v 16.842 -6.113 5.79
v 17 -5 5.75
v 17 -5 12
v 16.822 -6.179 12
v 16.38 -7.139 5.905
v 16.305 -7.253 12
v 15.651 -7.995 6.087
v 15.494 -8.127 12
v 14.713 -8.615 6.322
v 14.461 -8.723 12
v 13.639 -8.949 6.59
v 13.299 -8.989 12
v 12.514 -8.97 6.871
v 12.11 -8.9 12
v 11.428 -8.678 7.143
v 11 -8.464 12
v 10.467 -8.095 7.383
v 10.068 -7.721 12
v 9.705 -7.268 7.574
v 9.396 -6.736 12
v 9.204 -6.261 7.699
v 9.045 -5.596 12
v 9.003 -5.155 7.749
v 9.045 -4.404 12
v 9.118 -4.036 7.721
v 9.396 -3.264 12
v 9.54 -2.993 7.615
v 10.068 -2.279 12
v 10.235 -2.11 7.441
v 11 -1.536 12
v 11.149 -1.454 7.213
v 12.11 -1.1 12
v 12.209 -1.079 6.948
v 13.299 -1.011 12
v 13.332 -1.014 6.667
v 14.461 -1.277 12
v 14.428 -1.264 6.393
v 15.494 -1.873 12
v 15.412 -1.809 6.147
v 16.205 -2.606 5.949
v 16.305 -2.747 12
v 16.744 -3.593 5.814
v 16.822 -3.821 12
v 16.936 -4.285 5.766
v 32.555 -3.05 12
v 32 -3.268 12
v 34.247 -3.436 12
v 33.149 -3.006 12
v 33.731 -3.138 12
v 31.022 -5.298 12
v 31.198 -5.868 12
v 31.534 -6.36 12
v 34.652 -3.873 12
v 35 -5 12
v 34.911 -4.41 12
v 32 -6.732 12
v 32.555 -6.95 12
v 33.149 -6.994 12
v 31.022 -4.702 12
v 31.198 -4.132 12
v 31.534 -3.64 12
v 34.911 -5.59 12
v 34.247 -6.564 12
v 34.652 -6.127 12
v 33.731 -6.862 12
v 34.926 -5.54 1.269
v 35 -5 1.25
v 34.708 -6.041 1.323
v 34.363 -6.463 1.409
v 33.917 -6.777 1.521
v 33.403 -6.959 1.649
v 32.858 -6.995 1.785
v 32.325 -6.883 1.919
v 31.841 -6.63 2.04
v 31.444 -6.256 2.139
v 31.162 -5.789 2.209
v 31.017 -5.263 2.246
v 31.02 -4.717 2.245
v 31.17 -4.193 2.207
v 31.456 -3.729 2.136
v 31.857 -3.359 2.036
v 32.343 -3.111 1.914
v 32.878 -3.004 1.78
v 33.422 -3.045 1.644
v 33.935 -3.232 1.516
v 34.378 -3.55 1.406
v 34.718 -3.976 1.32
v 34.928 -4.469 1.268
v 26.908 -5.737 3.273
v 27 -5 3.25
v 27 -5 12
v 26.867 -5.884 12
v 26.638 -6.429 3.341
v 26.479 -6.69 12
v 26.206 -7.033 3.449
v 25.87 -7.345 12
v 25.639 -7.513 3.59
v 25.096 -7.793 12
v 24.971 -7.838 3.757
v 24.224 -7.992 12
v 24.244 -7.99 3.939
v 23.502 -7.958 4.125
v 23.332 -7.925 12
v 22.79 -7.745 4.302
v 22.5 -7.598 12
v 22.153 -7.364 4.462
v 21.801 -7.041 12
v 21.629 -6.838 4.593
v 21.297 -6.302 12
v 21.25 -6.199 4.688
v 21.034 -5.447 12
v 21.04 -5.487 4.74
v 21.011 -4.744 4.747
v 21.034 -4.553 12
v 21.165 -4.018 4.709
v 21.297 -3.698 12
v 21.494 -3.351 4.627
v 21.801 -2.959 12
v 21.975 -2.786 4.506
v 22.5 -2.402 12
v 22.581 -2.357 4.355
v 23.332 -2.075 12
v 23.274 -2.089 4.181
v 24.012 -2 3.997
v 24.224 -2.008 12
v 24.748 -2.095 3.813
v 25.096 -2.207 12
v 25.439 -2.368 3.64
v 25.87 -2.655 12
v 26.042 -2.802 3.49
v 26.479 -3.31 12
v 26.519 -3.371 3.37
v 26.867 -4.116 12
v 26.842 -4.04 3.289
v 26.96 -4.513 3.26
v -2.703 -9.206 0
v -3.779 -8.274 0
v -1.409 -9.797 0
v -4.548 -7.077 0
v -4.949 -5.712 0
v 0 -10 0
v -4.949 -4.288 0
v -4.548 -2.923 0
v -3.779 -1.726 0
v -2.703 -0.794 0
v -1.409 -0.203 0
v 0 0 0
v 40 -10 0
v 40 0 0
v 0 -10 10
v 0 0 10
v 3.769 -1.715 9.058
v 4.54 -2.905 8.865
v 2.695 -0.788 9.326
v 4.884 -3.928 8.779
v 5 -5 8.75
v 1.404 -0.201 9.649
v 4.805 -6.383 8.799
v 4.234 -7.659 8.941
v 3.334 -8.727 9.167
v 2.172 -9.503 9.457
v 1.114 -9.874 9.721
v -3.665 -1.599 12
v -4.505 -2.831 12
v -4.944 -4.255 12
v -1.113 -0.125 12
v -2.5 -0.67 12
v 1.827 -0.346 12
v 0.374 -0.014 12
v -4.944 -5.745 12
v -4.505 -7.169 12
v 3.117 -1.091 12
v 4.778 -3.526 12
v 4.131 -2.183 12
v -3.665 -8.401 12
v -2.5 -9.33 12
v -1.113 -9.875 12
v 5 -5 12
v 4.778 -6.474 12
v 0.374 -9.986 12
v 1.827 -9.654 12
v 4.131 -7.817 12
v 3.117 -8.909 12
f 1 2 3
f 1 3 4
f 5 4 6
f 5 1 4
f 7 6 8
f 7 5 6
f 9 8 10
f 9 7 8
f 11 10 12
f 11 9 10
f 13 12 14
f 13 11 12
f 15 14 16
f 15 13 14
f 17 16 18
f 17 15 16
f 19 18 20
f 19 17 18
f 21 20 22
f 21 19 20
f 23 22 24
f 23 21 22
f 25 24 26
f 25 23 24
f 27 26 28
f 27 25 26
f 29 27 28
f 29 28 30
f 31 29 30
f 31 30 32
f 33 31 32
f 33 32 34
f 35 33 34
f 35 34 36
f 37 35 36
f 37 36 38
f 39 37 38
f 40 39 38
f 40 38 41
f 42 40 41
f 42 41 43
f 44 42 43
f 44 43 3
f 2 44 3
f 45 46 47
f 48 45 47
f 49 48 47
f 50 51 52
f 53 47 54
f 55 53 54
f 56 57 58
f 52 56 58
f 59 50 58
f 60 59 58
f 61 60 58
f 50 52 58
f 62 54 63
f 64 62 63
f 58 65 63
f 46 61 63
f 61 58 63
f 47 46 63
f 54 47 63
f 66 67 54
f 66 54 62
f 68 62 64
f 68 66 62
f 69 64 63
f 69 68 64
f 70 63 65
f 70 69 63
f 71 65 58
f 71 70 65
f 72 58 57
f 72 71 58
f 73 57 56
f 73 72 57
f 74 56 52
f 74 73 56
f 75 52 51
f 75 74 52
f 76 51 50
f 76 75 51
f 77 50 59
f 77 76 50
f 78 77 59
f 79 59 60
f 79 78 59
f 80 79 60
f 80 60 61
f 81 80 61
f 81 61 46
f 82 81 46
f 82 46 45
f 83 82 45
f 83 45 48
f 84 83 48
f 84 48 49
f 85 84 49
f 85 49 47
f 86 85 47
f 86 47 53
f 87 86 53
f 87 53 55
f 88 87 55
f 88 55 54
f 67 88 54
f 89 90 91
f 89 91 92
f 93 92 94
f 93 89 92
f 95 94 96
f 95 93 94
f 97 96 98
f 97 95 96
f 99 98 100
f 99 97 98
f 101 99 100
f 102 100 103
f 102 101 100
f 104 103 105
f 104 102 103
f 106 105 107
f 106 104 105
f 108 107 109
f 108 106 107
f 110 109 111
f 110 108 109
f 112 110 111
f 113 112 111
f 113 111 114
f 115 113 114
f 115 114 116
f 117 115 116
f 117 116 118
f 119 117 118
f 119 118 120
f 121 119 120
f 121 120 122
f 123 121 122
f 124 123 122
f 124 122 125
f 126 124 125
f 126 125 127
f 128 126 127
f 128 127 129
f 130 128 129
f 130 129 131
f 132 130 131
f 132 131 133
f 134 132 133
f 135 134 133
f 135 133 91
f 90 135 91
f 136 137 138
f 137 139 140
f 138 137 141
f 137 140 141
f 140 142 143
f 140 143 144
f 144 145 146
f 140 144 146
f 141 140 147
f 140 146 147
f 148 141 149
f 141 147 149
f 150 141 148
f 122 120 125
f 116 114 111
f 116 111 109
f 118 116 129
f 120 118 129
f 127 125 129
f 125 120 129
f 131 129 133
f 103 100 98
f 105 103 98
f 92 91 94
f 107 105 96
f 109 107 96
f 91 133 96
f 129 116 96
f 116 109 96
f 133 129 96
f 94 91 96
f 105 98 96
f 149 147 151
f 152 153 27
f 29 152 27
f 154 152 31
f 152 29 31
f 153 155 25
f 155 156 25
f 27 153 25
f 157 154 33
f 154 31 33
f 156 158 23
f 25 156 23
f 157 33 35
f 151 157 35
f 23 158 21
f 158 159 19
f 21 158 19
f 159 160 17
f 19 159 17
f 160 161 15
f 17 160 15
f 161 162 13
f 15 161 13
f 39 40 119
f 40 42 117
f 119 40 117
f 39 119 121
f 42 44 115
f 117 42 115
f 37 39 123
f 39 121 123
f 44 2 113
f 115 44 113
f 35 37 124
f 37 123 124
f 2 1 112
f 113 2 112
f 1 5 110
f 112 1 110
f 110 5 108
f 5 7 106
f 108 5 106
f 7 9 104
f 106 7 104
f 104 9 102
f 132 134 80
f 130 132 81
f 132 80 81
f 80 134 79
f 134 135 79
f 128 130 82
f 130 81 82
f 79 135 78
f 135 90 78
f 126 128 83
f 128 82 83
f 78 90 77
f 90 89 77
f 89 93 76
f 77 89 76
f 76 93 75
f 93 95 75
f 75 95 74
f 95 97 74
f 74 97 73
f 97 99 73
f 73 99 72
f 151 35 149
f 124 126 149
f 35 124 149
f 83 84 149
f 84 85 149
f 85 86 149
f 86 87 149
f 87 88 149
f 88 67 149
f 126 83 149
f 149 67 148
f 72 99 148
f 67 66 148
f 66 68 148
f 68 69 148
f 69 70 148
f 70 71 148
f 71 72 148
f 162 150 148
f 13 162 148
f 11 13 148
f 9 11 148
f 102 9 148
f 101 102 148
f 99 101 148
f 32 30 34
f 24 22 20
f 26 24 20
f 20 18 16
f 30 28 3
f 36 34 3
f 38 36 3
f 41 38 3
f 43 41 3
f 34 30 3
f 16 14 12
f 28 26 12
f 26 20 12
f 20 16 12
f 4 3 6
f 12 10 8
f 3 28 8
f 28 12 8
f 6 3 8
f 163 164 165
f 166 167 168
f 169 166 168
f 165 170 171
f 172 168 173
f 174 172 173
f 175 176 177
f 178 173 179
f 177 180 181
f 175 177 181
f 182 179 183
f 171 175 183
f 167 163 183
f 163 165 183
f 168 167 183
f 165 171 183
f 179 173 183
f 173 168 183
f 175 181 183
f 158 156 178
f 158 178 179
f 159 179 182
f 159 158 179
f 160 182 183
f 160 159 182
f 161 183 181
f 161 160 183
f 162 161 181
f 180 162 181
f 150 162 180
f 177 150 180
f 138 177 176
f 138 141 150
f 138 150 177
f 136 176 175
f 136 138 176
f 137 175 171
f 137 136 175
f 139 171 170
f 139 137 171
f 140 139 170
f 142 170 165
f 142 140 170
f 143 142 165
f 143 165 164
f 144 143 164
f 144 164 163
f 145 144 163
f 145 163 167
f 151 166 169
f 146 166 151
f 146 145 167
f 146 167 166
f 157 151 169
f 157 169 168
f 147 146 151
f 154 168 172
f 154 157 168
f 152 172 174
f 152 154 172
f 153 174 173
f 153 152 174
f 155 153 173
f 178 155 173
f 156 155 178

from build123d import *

# Parameters (mm, degrees)
F0_W     = 40
F0_H     = 10
F1_DEPTH = 10
F3_DEPTH = 25
F4_R     = 5
F4_R_2   = 2
F4_R_3   = 4
F4_R_4   = 3
F5_DEPTH = 12


with BuildPart() as f1:
    # F0 (on Top) → F1 (new body)
    with BuildSketch(Plane.XY):
        with Locations((20, -5)):
            Rectangle(F0_W, F0_H)
    extrude(amount=F1_DEPTH)

    # F2 (on face) → F3 (cut)
    with BuildSketch(Plane.XZ.offset(10)):
        Polygon((40, 10), (0, 10), (40, 0), align=None)
    extrude(amount=-F3_DEPTH, mode=Mode.SUBTRACT)

    # F4 (on face) → F5 (join)
    with BuildSketch(Plane(origin=(0, 0, 0), x_dir=(1, 0, 0), z_dir=(0, 0, -1))):
        with Locations((0, 5)):
            Circle(F4_R)
        with Locations((33, 5)):
            Circle(F4_R_2)
        with Locations((13, 5)):
            Circle(F4_R_3)
        with Locations((24, 5)):
            Circle(F4_R_4)
    extrude(amount=-F5_DEPTH)


solid = f1.part
